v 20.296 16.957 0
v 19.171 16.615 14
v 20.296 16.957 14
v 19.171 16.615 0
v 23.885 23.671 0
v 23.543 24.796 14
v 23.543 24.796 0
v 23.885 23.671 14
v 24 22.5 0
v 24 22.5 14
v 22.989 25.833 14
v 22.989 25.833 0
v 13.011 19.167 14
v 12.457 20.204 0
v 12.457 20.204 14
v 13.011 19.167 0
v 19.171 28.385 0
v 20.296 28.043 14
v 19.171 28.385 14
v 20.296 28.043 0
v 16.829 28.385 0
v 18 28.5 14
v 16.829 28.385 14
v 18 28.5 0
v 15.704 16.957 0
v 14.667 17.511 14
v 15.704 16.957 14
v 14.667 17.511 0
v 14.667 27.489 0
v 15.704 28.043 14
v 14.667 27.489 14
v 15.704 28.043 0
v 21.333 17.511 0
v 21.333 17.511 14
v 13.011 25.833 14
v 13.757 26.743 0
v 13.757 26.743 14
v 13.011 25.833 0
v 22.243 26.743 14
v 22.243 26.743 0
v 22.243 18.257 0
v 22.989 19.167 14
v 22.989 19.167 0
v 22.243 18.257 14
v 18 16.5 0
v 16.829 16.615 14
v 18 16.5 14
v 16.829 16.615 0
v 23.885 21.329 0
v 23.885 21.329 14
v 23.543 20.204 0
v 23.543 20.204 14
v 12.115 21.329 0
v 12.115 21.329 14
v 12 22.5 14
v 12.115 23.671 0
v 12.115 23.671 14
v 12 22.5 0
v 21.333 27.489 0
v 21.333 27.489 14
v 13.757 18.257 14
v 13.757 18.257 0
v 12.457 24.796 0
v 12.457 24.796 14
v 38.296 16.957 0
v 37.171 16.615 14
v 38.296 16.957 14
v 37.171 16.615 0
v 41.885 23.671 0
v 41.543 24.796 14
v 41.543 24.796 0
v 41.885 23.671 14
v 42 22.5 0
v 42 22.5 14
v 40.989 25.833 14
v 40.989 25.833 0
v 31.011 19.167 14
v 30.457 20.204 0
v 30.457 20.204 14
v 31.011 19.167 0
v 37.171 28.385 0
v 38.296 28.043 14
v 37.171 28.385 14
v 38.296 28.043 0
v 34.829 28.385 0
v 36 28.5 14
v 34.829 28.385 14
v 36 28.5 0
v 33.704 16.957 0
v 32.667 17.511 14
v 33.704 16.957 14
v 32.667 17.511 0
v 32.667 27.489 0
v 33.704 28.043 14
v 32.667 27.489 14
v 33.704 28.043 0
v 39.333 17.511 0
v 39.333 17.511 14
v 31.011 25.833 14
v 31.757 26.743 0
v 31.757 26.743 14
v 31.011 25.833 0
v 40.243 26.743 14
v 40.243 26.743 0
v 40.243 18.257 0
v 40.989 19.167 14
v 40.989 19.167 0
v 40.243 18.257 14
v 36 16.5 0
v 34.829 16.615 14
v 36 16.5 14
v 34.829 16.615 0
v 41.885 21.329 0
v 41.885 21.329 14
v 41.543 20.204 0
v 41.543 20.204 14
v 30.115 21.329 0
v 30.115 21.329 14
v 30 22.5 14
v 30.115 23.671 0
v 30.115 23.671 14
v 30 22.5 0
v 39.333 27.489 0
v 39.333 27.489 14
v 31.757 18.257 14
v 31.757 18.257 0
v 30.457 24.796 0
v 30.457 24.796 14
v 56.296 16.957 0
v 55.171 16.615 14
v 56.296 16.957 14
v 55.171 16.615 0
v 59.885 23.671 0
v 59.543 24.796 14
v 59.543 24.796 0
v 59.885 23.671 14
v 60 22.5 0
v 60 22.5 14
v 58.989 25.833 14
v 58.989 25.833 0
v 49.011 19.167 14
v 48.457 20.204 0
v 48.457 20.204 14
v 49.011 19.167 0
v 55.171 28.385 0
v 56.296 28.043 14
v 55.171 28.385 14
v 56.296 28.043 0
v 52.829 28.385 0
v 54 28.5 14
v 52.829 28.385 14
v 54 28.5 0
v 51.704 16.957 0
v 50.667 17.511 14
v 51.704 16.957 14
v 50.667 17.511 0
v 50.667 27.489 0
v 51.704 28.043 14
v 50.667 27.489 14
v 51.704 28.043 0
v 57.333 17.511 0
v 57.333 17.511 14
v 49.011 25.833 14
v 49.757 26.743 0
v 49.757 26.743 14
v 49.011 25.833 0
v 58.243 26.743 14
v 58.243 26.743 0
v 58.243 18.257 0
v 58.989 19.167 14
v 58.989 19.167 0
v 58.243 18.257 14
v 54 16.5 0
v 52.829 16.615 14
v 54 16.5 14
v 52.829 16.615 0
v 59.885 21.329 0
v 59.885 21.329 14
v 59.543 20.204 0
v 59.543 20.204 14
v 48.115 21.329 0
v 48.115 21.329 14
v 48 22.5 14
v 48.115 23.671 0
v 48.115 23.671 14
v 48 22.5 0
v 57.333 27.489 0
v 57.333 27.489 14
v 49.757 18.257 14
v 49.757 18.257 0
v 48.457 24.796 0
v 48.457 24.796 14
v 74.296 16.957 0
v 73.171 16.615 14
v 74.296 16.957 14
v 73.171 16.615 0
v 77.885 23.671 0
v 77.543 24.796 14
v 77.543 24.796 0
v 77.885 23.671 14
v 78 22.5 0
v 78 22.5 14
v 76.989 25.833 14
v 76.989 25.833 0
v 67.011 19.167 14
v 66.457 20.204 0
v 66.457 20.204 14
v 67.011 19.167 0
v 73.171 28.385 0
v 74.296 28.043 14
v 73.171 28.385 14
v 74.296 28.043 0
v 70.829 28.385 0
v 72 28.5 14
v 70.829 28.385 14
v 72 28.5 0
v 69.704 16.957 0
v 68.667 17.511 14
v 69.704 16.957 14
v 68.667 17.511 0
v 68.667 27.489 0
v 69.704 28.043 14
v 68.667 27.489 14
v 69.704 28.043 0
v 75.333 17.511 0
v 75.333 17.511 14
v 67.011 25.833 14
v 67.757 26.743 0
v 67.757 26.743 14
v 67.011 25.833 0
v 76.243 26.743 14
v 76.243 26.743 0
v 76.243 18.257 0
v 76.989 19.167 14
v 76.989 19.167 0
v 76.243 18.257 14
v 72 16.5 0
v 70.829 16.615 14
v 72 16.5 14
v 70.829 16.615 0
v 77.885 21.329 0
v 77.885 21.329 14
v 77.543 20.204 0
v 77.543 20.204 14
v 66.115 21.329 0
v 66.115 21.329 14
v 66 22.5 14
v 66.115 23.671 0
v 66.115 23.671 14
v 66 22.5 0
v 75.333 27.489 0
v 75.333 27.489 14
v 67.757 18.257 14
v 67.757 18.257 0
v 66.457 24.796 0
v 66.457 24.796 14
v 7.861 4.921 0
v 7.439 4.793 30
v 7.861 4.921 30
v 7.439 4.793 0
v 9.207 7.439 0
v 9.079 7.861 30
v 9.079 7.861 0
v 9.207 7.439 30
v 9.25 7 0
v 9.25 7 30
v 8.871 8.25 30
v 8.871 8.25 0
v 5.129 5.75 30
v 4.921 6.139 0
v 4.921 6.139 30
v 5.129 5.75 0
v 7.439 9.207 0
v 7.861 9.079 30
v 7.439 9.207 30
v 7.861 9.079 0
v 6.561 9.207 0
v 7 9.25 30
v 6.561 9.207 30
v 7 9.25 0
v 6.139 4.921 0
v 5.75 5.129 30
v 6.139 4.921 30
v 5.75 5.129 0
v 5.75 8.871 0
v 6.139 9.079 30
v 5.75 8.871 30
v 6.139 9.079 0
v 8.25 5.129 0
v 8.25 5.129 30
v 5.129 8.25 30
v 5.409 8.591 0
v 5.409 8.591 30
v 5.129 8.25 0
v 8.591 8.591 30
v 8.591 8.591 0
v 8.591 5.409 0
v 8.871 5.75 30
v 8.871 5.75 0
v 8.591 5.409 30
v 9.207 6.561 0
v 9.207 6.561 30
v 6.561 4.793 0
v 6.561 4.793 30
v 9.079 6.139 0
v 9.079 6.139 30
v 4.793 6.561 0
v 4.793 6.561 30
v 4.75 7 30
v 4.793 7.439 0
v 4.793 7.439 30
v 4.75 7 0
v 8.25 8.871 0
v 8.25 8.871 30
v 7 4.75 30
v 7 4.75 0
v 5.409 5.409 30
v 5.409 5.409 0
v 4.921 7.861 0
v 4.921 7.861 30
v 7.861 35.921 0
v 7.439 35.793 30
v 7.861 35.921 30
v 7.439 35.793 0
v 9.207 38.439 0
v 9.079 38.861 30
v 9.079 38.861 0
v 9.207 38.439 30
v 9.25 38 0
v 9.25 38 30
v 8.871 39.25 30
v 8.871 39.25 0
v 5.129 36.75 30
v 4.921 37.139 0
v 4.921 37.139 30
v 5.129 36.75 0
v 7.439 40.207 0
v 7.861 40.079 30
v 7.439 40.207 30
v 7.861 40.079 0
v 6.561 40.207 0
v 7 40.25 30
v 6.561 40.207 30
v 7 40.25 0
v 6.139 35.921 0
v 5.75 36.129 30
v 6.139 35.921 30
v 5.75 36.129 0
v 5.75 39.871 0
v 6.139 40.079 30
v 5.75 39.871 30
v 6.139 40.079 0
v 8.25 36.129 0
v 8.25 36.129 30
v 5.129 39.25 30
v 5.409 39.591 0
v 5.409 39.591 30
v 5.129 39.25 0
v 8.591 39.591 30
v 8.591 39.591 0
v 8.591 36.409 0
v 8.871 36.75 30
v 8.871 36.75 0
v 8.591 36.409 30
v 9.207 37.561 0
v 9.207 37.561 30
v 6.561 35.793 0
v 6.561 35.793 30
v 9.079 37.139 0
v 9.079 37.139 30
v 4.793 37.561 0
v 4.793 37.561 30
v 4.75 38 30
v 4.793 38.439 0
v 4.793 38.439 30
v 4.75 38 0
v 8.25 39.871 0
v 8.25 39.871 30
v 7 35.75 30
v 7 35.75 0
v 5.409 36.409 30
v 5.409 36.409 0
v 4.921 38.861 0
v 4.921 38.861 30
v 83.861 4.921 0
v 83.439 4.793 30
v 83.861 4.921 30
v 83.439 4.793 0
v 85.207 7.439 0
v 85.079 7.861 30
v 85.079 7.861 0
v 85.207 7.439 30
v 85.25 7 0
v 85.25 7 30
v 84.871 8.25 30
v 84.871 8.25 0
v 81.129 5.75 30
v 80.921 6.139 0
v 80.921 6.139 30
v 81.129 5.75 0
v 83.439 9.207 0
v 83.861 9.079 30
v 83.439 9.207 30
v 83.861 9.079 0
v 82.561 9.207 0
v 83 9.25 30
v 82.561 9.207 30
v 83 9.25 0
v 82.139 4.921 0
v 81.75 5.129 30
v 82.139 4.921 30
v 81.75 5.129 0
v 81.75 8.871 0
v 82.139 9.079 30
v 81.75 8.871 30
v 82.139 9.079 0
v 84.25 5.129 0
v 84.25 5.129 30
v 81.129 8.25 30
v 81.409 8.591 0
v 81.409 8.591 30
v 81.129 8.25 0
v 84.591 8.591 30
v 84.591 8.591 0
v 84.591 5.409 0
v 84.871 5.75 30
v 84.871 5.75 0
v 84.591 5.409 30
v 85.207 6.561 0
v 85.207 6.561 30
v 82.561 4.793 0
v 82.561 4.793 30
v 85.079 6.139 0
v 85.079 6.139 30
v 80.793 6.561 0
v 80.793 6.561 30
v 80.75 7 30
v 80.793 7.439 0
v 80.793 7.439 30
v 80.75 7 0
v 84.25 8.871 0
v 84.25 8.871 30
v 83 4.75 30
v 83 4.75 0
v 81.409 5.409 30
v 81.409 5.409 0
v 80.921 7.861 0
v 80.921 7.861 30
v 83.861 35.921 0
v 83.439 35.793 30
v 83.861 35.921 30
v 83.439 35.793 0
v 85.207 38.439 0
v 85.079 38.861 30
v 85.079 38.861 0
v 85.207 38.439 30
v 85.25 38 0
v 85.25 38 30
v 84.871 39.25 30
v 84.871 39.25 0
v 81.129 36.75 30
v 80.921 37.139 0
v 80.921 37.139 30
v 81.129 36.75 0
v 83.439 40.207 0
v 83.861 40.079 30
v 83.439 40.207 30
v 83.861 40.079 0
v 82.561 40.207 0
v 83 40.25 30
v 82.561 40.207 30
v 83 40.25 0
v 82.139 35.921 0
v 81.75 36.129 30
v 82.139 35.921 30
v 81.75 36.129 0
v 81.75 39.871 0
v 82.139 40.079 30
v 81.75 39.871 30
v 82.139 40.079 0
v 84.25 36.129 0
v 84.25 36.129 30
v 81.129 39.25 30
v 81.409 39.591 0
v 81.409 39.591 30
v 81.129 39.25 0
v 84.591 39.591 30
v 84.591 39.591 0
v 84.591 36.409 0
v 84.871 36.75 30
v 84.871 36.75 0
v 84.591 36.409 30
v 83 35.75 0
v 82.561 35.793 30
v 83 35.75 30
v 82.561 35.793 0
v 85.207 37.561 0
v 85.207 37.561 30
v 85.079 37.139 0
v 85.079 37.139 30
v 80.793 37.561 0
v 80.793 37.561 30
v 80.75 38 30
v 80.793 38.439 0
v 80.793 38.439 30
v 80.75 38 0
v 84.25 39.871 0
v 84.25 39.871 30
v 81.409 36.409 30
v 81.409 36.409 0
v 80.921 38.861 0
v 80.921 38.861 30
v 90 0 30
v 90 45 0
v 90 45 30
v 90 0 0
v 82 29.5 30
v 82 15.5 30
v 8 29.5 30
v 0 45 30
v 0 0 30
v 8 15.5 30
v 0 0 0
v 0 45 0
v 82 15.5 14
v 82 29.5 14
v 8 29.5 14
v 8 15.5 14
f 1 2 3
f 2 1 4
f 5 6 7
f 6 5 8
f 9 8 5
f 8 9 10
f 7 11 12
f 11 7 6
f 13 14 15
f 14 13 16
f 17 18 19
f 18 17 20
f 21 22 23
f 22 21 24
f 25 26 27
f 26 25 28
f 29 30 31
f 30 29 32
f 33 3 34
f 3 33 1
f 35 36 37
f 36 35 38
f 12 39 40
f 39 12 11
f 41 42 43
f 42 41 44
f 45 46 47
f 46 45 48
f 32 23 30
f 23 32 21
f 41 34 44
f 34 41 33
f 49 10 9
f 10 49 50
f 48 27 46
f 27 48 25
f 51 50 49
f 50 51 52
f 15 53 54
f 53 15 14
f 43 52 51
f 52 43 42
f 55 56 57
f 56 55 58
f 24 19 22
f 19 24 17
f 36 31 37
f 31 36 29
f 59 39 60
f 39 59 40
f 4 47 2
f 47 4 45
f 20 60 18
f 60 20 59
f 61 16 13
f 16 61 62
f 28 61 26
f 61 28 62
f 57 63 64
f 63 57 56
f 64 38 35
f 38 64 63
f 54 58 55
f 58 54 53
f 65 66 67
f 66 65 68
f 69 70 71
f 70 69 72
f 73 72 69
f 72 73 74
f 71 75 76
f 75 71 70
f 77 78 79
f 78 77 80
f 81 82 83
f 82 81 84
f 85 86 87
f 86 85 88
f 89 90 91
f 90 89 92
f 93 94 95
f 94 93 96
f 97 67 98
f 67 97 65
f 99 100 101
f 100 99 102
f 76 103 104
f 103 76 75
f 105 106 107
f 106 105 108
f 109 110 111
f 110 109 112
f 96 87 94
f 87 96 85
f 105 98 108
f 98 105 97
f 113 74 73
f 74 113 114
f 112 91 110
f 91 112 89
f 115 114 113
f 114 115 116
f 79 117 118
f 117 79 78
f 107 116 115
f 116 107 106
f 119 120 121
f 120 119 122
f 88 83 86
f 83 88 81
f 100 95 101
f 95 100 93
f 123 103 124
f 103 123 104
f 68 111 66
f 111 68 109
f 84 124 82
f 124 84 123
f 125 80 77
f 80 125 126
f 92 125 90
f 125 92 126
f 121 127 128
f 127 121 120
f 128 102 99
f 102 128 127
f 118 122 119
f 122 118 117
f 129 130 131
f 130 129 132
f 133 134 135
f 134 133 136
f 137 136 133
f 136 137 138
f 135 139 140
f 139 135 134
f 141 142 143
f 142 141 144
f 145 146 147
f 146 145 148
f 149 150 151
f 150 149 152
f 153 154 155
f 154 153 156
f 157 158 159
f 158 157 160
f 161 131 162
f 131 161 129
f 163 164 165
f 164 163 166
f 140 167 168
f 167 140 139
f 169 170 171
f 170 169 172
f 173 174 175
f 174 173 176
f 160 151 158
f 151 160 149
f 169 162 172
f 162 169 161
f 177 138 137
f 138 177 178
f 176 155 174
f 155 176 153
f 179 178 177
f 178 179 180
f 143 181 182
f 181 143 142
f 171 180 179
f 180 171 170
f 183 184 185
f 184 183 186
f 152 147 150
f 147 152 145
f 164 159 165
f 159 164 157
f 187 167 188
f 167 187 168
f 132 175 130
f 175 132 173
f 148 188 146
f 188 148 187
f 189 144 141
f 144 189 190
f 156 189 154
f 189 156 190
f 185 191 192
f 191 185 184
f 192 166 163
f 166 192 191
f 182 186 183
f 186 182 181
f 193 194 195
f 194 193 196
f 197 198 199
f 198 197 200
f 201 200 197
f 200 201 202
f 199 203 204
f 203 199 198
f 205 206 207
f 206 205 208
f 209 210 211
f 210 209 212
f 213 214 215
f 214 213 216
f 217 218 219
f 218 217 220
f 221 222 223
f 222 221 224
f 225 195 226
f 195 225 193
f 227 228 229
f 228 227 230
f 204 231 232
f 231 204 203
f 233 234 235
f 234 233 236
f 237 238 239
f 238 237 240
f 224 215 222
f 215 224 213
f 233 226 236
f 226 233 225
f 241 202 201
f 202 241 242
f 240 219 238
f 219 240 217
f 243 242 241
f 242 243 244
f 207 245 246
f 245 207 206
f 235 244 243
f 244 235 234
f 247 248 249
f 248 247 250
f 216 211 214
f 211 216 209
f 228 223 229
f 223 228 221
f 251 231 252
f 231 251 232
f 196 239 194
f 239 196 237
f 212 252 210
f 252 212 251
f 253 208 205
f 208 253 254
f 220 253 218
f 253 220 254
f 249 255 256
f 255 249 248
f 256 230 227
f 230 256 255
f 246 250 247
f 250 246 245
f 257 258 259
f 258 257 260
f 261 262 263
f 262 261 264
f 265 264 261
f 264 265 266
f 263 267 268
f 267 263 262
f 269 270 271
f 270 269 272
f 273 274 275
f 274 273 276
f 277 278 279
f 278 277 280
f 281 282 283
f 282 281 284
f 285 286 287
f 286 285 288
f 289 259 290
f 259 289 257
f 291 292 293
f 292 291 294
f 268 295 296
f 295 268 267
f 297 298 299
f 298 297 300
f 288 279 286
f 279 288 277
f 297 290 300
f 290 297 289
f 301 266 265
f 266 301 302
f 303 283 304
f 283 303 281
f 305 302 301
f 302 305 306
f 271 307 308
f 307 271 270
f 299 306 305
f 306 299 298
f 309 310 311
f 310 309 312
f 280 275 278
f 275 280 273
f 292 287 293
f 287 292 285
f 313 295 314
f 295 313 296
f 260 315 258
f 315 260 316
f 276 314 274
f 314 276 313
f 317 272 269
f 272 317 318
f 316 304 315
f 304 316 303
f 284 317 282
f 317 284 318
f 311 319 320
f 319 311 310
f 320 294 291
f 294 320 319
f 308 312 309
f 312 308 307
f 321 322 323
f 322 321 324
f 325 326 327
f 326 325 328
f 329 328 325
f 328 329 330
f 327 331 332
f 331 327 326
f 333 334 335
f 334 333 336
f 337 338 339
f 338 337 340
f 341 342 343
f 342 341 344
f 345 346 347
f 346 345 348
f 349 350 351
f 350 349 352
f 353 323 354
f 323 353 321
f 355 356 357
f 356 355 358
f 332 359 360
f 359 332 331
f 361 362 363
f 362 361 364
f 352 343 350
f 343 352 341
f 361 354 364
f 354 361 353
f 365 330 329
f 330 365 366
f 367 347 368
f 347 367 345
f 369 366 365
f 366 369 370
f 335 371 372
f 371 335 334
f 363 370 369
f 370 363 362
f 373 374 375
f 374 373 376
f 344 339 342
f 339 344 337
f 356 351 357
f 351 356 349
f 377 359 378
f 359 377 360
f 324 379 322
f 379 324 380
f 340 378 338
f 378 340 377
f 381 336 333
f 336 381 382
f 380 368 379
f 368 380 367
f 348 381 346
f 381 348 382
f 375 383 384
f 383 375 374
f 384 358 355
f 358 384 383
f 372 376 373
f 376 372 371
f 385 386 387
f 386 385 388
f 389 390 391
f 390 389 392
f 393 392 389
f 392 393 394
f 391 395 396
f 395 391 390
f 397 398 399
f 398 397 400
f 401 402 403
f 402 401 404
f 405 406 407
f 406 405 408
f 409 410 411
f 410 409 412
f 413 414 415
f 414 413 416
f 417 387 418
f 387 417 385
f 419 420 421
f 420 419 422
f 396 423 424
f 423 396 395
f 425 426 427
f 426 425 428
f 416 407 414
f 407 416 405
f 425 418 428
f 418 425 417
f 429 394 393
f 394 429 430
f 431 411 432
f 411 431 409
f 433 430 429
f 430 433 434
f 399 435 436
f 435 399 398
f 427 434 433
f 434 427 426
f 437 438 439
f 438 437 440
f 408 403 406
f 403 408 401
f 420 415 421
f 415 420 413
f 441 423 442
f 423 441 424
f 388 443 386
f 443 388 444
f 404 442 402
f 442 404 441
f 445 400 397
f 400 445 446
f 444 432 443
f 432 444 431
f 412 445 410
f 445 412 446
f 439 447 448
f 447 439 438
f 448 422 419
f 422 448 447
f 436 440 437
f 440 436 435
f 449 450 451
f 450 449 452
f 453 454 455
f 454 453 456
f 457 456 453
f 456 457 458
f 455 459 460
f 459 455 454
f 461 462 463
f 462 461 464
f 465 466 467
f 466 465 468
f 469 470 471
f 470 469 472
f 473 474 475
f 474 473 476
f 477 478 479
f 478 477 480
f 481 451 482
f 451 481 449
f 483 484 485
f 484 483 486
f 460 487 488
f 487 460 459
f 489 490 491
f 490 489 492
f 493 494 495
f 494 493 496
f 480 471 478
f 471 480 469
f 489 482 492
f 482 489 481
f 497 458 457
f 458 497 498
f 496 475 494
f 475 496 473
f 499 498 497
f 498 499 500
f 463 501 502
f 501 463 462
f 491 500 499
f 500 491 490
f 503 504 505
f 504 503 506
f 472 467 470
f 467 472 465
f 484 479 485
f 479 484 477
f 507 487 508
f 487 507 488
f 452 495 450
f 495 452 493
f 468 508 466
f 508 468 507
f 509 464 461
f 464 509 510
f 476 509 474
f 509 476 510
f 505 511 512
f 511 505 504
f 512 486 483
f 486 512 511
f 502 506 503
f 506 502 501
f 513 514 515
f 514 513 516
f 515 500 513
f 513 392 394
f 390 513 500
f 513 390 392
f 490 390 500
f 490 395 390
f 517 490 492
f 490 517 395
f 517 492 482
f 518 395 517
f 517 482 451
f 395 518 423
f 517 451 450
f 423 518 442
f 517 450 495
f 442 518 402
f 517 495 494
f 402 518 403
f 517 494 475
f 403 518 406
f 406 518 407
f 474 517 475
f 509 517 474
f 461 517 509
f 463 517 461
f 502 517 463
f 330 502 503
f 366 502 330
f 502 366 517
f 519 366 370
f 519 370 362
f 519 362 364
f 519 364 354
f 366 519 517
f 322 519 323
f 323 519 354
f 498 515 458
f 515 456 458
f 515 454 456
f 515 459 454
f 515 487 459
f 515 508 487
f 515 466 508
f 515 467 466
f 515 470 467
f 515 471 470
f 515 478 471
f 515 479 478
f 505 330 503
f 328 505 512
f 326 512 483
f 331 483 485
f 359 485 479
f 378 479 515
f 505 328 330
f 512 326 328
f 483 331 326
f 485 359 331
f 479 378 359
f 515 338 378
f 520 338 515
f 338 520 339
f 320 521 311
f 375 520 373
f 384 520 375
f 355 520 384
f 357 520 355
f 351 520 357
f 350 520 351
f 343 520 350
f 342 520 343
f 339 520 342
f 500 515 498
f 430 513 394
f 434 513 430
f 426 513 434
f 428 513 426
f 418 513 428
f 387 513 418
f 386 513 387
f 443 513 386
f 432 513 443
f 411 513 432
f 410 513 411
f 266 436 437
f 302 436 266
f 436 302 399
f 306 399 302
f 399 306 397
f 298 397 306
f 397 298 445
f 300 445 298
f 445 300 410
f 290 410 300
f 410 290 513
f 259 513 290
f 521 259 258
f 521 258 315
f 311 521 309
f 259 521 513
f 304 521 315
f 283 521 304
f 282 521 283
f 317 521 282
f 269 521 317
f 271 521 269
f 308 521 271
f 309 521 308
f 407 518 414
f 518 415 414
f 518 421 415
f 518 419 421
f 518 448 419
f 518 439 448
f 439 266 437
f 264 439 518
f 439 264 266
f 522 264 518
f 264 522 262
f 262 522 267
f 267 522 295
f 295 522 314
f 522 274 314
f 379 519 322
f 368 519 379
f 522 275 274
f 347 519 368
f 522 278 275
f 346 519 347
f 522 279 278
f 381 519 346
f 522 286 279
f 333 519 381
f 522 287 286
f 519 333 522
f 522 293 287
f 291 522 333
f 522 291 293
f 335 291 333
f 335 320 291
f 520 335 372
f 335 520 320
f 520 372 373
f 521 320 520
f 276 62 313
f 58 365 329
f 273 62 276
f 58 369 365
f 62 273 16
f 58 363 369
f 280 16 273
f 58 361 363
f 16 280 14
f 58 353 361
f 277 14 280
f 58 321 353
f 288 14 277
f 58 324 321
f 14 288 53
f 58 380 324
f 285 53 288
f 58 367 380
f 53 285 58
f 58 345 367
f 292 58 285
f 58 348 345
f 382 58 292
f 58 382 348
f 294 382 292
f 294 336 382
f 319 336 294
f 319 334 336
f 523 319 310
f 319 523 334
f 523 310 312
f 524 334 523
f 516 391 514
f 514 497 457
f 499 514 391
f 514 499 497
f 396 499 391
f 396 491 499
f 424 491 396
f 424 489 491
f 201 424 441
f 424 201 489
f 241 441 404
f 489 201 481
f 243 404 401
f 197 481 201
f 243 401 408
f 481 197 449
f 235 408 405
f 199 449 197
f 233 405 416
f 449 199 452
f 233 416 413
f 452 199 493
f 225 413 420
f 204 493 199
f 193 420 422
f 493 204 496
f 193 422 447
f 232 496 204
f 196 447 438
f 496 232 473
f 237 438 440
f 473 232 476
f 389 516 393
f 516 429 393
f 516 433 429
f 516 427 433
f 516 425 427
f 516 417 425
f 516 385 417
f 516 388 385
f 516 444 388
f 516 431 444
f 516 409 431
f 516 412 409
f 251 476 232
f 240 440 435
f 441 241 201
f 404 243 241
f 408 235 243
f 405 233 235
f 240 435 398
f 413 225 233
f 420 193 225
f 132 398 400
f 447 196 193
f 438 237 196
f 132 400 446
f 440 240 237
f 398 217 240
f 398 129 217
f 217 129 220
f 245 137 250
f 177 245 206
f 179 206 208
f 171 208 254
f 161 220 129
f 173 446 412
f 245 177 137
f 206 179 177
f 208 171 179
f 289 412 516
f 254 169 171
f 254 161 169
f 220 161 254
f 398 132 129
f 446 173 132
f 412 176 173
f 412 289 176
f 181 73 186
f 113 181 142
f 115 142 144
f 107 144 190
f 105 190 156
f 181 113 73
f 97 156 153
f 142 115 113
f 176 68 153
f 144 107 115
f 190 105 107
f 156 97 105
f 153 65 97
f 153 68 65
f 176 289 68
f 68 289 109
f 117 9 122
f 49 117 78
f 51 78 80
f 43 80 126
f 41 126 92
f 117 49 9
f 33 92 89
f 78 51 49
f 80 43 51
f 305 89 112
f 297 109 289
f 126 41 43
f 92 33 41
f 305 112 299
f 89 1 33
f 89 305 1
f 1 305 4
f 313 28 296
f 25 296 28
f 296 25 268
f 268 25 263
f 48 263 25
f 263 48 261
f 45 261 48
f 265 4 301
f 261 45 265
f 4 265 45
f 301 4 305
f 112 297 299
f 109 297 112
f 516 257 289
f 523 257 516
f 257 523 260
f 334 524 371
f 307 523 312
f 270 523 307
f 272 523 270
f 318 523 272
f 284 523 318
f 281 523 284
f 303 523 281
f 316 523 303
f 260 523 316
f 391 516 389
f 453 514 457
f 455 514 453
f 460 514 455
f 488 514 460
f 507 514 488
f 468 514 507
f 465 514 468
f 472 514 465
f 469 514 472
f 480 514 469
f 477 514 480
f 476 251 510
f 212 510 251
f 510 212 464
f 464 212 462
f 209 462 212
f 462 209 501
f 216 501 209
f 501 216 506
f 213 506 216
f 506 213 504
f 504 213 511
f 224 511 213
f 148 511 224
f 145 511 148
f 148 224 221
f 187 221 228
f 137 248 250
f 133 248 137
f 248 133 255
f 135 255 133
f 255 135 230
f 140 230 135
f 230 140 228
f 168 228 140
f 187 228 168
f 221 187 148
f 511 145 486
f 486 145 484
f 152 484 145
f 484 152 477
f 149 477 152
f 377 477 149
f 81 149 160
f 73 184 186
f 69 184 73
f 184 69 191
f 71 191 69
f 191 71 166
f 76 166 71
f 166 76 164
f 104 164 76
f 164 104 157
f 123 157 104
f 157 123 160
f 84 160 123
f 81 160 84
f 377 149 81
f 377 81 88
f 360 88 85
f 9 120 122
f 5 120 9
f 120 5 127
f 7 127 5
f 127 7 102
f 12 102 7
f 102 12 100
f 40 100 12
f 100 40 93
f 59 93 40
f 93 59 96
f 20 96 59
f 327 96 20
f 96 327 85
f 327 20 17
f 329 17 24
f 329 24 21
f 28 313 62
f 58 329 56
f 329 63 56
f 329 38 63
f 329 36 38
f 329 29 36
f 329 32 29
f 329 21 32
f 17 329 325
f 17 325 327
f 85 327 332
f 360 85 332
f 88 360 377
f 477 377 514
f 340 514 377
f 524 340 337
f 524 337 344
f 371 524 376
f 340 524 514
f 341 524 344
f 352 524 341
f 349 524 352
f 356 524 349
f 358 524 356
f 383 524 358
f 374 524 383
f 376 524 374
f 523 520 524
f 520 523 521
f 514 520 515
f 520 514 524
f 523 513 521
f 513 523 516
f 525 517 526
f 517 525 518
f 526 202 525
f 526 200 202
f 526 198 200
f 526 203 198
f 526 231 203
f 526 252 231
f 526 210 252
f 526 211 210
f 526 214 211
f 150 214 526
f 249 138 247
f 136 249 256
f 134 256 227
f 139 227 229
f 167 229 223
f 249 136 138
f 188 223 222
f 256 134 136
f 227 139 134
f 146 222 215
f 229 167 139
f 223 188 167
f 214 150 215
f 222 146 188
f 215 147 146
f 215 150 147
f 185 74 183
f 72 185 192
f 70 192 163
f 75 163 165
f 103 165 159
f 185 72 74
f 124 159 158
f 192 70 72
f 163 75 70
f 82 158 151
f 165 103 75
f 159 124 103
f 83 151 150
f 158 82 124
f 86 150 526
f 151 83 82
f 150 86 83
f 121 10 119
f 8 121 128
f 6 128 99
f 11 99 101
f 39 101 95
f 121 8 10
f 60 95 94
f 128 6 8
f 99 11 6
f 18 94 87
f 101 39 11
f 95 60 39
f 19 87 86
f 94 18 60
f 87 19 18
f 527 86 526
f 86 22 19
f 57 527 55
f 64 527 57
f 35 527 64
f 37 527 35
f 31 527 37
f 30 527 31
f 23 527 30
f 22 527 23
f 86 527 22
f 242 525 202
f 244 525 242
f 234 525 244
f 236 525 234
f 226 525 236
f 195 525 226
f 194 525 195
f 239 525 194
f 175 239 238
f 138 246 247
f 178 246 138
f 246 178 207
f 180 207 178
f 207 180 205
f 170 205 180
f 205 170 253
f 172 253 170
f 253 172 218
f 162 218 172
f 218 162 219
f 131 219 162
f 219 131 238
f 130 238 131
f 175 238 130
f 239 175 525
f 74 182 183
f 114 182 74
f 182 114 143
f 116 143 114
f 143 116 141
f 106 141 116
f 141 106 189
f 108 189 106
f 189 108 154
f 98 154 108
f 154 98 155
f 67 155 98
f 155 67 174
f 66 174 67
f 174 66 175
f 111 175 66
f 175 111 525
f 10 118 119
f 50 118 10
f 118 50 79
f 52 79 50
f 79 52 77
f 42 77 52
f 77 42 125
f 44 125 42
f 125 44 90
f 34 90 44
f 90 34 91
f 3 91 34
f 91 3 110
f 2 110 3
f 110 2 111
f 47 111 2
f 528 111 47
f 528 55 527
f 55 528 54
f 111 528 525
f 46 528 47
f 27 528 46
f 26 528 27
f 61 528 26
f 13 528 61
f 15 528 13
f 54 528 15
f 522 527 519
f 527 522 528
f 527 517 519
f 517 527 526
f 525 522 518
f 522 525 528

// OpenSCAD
$fn = 32;

// ----------------------------------------------------------------------
// Manifold block: gallery_top manifold
// ----------------------------------------------------------------------

// --- parameters (mm) ---
block_l = 90;             // block length, X
block_w = 45;             // block width, Y
block_h = 30;             // block height, Z
port_d = 12;              // port bore diameter
port_pitch = 18;          // port pitch along X
gallery_d = 14;           // top gallery width, Y
gallery_depth = 16;       // gallery pocket depth
wall_p = 8;               // gallery end wall thickness, X
mnt_d = 4.5;              // mounting hole diameter
mnt_in = 7;               // mounting hole inset from the edges

n_ports = 4;  // ports in the row
port_x0 = (block_l - (n_ports - 1) * port_pitch) / 2;  // first port X

difference() {
  cube([block_l, block_w, block_h]);
  for (i = [0 : n_ports - 1])
    translate([port_x0 + i * port_pitch, block_w / 2, -1])
      cylinder(h = block_h + 2, d = port_d);
  translate([wall_p, block_w / 2 - gallery_d / 2, block_h - gallery_depth])
    cube([block_l - 2 * wall_p, gallery_d, gallery_depth + 1]);
  for (cx = [mnt_in, block_l - mnt_in])
    for (cy = [mnt_in, block_w - mnt_in])
      translate([cx, cy, -1]) cylinder(h = block_h + 2, d = mnt_d);
}
